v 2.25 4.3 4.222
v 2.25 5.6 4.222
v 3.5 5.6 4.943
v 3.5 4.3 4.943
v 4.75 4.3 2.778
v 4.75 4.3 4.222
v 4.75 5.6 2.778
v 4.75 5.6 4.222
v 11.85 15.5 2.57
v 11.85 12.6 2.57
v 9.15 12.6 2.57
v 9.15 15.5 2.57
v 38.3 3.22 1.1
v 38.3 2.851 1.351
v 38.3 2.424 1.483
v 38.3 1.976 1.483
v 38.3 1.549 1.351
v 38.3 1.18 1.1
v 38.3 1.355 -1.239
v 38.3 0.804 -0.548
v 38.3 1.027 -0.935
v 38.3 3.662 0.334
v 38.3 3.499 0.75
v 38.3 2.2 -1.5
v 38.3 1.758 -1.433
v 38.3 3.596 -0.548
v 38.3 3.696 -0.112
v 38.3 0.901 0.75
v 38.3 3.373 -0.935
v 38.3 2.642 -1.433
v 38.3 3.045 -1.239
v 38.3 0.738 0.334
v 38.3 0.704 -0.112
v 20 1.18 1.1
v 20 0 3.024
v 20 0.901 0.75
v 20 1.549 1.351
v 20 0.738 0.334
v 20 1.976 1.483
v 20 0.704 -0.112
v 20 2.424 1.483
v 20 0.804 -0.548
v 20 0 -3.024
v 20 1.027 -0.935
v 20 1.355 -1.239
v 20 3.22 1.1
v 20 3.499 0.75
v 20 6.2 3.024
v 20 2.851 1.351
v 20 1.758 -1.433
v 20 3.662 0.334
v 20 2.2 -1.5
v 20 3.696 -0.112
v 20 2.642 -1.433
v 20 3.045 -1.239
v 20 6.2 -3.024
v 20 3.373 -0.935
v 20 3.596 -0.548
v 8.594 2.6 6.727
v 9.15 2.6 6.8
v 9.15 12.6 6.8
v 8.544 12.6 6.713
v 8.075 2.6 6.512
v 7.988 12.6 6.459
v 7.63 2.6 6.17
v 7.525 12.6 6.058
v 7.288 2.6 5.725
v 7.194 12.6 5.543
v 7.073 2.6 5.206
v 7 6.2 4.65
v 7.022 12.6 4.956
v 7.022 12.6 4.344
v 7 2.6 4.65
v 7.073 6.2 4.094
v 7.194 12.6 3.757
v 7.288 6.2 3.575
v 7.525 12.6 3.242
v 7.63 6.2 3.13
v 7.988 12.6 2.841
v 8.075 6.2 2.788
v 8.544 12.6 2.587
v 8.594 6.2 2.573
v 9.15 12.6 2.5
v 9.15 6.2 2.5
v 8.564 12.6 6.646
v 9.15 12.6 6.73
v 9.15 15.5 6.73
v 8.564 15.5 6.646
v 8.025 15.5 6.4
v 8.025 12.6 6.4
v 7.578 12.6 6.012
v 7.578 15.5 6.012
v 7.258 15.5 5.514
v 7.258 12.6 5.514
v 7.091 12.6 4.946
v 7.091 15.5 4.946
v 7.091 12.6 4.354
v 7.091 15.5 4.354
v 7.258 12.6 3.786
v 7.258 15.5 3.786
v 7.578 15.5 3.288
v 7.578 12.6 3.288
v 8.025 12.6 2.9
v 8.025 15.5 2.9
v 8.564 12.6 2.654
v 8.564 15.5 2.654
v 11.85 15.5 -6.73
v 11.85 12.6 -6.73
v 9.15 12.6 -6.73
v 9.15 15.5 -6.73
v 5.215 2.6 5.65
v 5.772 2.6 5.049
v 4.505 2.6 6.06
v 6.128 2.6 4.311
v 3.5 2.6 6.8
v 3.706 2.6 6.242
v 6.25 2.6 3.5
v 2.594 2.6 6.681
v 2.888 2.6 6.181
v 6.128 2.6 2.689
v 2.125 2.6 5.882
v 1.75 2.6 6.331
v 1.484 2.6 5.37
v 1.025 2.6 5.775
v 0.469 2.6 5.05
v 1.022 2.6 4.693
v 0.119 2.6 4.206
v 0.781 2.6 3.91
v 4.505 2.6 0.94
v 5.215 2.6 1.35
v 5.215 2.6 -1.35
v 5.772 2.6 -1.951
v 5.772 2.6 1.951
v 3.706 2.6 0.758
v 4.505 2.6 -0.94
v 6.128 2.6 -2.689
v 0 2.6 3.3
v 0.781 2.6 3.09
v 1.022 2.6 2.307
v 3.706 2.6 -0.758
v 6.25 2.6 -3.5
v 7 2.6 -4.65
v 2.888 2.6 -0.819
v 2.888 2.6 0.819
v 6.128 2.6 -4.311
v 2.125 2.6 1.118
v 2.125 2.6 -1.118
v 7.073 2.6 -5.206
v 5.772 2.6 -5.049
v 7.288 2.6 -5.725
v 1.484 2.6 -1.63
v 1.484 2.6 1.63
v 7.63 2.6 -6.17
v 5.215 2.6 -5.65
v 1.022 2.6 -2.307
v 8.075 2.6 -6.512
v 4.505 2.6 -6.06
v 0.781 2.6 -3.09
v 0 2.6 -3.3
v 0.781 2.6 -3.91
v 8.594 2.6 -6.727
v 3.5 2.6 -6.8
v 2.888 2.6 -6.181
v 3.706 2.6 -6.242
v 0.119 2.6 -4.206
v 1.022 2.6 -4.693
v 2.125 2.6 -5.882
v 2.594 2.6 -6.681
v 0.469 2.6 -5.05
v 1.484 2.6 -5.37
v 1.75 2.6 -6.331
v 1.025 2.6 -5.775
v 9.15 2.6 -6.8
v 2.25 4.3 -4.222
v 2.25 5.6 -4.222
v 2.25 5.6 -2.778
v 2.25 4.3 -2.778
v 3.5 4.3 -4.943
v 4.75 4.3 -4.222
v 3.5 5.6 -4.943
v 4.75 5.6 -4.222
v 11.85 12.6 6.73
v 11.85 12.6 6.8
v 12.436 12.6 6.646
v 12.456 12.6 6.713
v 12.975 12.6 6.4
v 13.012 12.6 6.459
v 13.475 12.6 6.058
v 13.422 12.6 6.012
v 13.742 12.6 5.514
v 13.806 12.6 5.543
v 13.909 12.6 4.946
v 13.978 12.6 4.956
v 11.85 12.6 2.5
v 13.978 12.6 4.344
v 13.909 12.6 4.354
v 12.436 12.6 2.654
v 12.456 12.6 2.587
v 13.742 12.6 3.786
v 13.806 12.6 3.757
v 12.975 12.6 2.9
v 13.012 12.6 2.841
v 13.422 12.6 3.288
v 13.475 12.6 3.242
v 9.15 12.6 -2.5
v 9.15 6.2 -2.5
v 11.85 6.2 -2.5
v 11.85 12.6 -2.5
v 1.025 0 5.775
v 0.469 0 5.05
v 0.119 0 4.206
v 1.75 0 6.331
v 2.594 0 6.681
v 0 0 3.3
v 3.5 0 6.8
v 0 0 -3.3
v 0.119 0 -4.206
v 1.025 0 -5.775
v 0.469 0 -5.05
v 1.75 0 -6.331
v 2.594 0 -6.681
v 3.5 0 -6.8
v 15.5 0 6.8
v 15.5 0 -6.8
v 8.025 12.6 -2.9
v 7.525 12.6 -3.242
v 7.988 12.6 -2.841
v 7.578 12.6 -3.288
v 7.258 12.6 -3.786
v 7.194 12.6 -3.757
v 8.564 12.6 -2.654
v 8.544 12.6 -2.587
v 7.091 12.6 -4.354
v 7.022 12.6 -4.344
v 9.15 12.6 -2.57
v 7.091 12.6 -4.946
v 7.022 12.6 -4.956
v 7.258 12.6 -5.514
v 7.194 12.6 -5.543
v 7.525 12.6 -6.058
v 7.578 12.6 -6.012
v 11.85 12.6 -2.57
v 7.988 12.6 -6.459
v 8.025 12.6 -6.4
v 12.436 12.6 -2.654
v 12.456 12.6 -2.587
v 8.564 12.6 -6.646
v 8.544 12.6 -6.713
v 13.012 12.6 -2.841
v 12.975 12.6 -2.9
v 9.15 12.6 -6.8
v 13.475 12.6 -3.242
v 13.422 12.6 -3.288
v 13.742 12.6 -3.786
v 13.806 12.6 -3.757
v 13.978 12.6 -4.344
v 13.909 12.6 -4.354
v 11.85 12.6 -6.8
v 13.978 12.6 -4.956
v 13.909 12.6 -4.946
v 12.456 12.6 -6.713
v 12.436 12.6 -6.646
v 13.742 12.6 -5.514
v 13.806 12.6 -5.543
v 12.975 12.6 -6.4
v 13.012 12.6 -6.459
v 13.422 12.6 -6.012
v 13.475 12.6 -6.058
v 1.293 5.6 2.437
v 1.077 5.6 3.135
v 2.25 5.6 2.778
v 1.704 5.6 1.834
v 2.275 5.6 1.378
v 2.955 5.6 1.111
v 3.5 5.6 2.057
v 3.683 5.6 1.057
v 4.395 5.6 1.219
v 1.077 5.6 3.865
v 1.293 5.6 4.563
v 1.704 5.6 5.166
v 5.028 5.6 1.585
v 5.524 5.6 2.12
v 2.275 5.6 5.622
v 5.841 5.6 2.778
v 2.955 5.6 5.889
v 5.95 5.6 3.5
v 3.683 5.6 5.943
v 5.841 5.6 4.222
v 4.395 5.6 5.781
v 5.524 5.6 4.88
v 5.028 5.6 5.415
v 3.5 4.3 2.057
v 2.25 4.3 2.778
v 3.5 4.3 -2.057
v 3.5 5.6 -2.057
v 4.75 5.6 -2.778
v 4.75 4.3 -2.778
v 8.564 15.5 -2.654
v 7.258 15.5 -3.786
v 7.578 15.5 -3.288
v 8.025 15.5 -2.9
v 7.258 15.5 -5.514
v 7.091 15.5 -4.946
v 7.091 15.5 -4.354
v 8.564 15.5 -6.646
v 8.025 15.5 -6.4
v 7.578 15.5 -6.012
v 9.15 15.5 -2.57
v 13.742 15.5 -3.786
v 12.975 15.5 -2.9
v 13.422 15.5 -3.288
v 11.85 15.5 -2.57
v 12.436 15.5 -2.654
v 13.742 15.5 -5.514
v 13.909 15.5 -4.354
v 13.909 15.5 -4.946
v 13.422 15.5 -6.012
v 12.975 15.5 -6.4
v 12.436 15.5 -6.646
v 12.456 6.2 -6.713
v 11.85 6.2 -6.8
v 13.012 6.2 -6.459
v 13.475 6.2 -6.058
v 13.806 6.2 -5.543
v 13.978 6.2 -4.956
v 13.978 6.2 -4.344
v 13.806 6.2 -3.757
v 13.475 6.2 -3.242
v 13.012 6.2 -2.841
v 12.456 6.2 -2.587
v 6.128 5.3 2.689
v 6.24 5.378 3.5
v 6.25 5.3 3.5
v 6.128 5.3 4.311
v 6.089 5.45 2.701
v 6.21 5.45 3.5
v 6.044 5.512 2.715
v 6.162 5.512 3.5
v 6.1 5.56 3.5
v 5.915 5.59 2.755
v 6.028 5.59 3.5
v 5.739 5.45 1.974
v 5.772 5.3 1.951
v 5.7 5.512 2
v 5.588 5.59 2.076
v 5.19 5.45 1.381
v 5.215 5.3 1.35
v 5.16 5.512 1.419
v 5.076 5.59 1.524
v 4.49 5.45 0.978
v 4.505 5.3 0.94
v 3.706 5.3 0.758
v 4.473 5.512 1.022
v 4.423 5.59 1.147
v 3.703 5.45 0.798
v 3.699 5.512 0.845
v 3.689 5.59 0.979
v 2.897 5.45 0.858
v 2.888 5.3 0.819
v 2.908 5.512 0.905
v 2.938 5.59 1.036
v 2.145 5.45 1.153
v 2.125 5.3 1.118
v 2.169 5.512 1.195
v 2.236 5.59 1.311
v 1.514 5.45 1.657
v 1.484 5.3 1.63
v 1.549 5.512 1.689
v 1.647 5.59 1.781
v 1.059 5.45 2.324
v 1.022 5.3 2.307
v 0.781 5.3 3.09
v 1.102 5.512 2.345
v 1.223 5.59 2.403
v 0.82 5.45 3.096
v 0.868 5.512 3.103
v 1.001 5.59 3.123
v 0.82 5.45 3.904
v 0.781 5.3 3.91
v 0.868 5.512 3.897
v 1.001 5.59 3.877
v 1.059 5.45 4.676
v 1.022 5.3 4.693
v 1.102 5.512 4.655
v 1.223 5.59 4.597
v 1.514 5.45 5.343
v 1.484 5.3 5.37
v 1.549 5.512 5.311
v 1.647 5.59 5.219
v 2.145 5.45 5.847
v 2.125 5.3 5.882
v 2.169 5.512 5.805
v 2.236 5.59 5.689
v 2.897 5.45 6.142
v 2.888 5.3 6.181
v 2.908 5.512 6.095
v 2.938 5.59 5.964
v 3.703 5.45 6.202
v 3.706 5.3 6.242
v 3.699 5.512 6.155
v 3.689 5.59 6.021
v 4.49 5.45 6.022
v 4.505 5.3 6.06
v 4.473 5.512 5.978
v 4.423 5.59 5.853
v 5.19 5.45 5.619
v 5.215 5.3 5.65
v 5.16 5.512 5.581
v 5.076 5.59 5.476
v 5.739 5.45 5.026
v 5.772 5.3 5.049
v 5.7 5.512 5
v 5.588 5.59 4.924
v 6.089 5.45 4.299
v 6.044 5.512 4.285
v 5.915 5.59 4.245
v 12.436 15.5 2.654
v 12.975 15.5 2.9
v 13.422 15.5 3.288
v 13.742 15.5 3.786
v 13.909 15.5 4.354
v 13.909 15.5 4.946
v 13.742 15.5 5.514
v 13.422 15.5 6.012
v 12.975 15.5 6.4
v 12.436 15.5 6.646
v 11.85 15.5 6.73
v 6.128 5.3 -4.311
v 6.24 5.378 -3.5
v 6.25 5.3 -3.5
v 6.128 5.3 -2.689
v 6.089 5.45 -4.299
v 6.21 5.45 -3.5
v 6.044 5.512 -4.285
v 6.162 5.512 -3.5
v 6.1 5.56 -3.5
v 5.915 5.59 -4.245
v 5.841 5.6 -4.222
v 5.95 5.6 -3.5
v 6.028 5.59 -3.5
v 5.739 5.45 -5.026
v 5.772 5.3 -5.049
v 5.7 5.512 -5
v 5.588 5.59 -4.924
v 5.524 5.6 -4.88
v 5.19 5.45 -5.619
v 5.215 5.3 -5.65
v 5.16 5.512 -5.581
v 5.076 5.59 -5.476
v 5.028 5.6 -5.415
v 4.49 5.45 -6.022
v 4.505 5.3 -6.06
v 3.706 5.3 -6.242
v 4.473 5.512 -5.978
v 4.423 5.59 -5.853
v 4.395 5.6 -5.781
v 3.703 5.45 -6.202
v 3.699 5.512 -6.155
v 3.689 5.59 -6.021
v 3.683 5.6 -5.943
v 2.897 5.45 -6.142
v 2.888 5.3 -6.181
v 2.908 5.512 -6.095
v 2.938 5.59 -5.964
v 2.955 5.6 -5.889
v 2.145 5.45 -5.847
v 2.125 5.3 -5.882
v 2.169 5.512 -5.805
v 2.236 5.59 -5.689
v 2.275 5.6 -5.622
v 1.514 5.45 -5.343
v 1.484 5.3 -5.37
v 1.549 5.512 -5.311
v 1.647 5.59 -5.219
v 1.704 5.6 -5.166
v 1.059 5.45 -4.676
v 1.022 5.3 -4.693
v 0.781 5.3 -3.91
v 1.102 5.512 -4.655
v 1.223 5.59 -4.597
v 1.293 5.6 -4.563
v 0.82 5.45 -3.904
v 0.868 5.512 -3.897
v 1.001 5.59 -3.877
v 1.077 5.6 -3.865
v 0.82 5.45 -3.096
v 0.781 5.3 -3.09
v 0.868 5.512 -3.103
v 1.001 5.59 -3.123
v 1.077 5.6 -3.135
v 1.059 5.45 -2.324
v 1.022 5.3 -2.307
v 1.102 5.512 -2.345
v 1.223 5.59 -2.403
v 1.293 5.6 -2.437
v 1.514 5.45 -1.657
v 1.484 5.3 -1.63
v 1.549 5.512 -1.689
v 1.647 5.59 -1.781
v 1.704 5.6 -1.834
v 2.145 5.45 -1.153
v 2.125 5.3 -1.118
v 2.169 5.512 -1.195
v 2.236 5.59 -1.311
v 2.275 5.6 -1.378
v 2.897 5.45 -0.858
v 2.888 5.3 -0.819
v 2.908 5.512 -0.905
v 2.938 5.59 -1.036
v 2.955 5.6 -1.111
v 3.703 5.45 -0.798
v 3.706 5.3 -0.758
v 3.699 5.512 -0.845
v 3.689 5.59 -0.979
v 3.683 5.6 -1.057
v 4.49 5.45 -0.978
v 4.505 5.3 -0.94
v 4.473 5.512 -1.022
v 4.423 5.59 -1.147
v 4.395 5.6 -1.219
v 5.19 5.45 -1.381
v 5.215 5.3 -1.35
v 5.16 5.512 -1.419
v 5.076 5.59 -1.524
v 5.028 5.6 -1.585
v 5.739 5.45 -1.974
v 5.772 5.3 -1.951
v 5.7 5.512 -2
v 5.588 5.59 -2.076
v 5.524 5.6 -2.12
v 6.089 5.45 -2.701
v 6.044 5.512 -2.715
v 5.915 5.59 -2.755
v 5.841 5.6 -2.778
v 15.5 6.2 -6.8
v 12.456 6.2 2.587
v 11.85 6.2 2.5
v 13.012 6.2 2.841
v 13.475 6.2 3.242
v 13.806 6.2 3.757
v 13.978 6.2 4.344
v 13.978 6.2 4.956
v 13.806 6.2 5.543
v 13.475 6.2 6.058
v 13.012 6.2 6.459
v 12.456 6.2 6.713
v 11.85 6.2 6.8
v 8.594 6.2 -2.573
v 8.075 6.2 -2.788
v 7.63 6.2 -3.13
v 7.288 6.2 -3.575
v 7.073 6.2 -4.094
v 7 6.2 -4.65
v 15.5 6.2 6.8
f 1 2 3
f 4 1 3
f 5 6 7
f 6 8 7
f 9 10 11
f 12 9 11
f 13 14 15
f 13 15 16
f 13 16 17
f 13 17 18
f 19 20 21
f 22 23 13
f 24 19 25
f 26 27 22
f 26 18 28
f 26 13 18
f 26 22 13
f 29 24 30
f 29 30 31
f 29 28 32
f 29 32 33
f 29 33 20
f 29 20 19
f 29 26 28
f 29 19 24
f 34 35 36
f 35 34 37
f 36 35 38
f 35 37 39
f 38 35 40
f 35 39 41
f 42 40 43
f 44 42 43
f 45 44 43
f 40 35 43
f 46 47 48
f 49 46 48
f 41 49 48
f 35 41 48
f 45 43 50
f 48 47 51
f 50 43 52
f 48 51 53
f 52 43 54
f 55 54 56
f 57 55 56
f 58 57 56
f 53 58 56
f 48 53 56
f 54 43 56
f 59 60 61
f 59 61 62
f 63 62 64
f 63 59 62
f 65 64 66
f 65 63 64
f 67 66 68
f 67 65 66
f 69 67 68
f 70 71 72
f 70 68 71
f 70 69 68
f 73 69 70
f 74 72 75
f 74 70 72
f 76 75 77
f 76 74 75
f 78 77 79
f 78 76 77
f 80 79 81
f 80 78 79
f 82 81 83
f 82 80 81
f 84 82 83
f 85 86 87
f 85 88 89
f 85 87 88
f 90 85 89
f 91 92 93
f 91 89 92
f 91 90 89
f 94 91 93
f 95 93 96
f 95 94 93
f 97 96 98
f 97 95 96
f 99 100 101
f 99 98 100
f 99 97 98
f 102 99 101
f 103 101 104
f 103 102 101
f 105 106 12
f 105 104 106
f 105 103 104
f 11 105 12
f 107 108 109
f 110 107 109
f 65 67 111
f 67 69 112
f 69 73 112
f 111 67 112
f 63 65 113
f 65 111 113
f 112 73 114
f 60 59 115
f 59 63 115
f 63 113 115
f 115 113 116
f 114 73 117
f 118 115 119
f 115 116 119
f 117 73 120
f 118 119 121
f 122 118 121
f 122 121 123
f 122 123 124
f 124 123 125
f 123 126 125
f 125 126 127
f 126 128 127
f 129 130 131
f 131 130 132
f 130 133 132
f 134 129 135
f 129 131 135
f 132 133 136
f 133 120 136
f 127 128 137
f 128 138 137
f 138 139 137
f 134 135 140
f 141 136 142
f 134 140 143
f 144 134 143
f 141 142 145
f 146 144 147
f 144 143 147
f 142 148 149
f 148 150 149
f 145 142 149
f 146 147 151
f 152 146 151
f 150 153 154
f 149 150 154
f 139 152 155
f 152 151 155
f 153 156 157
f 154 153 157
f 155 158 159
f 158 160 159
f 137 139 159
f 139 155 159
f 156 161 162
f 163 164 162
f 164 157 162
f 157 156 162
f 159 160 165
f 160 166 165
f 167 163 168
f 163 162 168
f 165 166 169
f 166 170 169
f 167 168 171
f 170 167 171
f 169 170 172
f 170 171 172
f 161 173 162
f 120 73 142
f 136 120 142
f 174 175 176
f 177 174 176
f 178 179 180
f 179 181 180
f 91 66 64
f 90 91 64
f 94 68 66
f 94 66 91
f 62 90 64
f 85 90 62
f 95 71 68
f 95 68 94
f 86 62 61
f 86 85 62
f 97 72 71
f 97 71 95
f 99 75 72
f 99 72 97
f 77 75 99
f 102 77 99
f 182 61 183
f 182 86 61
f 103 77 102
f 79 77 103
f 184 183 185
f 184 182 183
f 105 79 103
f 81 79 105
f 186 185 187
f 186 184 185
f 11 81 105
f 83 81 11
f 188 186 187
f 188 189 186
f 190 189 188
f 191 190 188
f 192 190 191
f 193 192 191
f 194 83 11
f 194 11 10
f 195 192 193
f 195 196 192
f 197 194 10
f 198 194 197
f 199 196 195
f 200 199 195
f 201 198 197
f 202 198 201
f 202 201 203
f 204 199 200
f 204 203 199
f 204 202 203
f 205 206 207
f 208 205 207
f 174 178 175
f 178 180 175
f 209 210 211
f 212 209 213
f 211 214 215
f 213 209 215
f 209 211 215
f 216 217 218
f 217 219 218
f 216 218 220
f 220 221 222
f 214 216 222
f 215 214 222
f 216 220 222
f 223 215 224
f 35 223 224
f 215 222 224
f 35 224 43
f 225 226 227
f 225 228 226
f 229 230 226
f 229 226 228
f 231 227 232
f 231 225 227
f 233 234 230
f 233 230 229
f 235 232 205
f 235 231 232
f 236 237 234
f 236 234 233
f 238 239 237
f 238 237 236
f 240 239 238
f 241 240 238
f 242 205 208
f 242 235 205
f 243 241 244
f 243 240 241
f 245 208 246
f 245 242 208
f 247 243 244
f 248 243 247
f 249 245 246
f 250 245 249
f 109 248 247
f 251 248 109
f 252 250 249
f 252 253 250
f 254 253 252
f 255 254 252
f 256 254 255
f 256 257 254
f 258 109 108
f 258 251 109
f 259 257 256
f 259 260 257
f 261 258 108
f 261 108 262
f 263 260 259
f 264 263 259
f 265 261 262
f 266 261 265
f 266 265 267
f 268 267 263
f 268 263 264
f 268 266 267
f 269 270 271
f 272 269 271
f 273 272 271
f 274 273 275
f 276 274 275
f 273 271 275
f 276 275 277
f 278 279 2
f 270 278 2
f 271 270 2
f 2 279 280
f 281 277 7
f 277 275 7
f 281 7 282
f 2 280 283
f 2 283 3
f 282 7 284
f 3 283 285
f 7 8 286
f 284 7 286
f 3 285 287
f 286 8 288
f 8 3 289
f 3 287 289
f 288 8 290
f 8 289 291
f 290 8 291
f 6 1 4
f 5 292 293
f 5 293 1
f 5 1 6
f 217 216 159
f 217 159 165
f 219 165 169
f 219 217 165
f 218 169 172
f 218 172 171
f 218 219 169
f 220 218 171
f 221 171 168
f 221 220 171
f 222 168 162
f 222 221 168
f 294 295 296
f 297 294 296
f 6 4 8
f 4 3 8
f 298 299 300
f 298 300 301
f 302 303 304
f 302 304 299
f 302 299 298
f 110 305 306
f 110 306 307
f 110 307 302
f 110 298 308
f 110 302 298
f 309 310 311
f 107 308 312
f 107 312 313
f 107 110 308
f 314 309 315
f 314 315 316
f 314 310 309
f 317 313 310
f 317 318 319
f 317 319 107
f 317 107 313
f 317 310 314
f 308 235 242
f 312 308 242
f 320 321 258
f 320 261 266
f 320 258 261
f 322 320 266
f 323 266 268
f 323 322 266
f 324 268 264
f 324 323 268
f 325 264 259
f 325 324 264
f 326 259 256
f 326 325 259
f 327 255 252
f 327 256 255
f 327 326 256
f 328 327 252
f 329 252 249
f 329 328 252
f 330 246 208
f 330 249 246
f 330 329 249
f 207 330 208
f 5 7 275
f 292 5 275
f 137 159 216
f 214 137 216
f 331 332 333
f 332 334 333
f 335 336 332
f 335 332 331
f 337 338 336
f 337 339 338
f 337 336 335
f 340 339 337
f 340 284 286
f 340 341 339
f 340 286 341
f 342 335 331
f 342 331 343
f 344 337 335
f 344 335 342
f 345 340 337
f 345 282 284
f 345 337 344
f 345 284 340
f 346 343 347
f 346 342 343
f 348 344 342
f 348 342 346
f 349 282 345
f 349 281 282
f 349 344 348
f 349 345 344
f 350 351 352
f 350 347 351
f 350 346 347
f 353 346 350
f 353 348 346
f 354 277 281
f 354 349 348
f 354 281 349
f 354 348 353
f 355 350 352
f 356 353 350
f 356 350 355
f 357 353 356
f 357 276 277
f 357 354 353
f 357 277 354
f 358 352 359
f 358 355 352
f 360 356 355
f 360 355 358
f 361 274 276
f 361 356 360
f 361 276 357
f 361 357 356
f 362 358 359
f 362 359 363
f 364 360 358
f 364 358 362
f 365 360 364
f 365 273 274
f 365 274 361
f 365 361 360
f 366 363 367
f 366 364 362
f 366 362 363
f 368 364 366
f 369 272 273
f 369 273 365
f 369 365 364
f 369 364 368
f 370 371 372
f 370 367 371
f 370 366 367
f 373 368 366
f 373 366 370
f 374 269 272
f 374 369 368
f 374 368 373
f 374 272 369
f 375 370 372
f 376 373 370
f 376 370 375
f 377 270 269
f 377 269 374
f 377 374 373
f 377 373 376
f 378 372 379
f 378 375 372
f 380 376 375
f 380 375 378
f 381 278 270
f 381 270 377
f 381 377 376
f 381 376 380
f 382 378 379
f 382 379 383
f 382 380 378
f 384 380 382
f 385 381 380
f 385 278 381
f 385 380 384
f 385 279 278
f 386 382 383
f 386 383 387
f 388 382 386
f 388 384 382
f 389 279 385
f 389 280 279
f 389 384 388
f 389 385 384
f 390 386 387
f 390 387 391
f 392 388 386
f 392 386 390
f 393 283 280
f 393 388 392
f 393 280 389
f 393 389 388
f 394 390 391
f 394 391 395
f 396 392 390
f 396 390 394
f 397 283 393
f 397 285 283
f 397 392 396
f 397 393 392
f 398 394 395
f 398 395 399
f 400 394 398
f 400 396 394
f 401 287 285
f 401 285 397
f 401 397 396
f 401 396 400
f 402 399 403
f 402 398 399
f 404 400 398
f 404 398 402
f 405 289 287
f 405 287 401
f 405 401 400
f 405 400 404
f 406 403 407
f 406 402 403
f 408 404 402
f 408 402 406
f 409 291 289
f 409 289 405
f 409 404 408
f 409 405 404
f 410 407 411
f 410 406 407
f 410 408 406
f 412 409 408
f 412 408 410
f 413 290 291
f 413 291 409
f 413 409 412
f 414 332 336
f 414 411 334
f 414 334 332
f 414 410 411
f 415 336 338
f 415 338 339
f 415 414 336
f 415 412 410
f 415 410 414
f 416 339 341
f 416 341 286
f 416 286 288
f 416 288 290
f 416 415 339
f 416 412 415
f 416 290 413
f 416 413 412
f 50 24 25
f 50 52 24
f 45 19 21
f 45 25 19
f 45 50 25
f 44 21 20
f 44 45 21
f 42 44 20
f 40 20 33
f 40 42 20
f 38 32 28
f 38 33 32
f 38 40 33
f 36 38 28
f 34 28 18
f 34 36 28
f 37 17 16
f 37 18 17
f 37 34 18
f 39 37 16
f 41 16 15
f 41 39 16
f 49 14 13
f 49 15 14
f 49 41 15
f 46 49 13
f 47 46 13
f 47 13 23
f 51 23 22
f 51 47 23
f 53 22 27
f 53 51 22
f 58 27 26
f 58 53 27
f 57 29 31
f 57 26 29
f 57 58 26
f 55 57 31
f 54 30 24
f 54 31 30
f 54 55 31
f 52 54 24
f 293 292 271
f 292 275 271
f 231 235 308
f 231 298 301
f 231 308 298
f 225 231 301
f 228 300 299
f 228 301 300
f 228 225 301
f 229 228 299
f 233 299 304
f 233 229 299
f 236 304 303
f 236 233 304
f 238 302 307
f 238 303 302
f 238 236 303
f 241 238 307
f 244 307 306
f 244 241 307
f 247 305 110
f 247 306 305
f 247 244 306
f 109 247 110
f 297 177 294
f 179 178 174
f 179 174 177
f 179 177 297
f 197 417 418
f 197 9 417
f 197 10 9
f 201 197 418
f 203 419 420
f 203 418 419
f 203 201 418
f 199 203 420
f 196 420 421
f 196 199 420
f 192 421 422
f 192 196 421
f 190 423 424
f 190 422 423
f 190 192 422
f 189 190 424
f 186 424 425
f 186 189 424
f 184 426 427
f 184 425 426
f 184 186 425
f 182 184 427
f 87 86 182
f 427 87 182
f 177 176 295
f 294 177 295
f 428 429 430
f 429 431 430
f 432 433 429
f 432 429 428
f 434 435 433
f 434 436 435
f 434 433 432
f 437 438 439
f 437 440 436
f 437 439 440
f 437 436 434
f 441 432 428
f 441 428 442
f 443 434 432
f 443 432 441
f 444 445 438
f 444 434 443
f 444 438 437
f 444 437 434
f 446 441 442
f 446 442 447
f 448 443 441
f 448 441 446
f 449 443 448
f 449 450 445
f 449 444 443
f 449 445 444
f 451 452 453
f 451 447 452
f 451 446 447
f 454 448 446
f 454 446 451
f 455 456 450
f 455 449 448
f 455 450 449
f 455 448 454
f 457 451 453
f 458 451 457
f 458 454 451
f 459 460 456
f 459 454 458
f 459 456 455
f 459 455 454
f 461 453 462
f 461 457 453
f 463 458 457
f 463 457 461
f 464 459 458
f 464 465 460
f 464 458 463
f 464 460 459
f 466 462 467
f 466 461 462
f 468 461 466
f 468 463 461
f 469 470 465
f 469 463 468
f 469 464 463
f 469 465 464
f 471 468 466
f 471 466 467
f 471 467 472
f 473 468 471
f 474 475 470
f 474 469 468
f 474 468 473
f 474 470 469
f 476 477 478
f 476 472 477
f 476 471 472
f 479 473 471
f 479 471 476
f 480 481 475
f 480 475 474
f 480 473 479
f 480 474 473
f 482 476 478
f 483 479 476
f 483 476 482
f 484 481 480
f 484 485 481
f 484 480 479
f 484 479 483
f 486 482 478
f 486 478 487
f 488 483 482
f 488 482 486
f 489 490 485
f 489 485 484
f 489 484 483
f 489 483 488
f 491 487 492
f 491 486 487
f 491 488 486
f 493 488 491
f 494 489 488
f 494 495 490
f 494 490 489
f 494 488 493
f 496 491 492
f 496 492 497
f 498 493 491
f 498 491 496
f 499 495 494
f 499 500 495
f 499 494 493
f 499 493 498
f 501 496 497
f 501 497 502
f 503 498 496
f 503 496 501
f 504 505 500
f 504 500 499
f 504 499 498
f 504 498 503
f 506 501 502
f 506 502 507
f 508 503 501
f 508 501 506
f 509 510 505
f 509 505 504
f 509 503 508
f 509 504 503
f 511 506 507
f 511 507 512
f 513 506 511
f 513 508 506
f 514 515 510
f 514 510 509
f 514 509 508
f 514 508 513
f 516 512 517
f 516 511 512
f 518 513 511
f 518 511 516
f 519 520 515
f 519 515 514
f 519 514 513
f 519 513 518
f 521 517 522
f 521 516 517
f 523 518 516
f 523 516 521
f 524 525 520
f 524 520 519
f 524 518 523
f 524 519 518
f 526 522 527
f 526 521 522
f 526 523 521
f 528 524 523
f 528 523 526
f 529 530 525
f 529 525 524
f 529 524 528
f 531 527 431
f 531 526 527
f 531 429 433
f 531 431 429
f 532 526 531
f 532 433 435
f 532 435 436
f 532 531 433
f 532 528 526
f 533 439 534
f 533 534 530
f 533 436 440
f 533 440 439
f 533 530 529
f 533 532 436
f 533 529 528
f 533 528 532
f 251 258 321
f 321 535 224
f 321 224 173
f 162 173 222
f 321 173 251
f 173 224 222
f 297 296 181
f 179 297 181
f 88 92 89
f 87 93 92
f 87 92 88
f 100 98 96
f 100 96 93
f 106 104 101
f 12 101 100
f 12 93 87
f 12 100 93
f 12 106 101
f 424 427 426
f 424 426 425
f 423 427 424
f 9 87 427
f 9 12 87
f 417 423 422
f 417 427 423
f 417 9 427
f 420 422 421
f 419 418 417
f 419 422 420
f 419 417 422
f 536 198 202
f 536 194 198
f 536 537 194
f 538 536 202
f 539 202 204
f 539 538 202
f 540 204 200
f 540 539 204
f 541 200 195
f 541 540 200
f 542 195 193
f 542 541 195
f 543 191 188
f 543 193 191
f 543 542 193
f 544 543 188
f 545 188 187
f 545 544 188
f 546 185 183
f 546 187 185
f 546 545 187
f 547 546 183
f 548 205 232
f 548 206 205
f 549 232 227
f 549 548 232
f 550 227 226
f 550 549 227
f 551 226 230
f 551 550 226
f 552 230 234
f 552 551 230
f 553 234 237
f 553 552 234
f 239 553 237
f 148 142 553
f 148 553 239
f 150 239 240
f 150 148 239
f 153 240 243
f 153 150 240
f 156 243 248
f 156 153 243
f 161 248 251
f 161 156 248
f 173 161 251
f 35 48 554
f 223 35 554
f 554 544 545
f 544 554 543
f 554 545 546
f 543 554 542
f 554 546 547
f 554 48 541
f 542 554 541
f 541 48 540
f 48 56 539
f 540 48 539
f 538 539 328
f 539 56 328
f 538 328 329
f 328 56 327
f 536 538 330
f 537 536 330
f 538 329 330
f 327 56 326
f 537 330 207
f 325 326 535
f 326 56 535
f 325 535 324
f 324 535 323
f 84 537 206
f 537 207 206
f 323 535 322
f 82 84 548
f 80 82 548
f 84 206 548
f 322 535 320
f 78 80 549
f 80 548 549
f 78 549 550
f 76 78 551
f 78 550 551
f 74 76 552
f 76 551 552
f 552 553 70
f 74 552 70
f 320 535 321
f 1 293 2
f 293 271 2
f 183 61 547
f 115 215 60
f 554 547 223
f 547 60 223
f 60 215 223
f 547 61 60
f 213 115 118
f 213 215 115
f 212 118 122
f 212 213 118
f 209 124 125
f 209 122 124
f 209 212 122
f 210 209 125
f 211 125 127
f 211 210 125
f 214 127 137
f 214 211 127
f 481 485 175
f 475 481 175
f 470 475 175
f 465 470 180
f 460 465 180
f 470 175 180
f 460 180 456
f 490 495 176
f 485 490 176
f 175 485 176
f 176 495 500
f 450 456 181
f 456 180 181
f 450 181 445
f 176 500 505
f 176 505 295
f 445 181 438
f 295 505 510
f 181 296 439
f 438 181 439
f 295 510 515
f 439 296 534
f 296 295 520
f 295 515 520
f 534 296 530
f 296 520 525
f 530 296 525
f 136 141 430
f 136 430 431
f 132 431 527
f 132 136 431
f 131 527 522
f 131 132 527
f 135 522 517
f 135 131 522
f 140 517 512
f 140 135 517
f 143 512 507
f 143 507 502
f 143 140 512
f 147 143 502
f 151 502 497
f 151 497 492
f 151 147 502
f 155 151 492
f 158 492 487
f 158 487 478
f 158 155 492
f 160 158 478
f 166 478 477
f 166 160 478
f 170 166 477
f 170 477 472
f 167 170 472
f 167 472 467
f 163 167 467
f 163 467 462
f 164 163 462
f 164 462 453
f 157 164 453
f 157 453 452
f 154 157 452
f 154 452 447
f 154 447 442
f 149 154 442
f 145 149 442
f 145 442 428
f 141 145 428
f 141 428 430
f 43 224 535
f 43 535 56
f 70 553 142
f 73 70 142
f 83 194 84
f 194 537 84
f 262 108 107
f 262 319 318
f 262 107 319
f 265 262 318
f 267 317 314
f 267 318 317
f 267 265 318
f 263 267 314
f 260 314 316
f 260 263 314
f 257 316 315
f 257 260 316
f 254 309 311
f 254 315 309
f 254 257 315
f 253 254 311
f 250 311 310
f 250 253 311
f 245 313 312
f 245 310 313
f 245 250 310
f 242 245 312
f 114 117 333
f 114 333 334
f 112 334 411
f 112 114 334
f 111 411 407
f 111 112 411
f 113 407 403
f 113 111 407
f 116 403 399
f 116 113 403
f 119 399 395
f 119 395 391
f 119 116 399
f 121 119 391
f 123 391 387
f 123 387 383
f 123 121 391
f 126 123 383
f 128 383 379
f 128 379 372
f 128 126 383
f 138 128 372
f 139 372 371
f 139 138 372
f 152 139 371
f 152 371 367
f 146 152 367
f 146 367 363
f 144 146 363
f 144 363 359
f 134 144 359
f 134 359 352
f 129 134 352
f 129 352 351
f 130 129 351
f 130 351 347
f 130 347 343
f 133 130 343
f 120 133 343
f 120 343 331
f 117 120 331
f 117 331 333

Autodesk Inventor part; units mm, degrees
sketch "Sketch_1" plane through (0, 0, 0) normal (0, 0, 1) x (1, 0, 0)
  line L0 (0, 2.6) -> (0, 0)
  line L1 (0, 0) -> (20, 0)
  line L2 (20, 0) -> (20, 6.2)
  line L3 (20, 6.2) -> (7, 6.2)
  line L4 (7, 6.2) -> (7, 2.6)
  line L5 (7, 2.6) -> (0, 2.6)
extrude "Extrusion1" add sketch "Sketch_1" along normal mid plane 13.6
fillet "Fillet1" radius 3.5 2 edges at (0, 1.3, 6.8) (0, 1.3, -6.8)
fillet "Fillet2" radius 2.15 2 edges at (7, 4.4, 6.8) (7, 4.4, -6.8)
sketch "Sketch_4" plane through (20, 0, 0) normal (1, 0, 0) x (0, 0, -1)
  circle A0 centre (0, 2.2) radius 1.5
extrude "Extrusion2" add sketch "Sketch_4" along normal blind 18.3
sketch "Sketch_7" plane through (0, 0, 3.5) normal (0, 0, 1) x (1, 0, 0)
  line L0 (3.5, 2.6) -> (3.5, 5.6)
  line L1 (3.5, 5.6) -> (5.95, 5.6)
  arc A0 (6.25, 5.3) -> (5.95, 5.6) centre (5.95, 5.3) ccw
  line L2 (6.25, 5.3) -> (6.25, 2.6)
  line L3 (6.25, 2.6) -> (3.5, 2.6)
  line L4 (3.5, 2.6) -> (3.5, 5.6)
revolve "Revolution1" add sketch "Sketch_7" angle 360 about axis through (3.5, 2.6, 3.5) along (0, -1, 0)
pattern_linear "Rectangular Pattern1" count 2 spacing 7 along (0, 0, -1) of "Revolution1"
sketch "Sketch_9" plane through (0, 5.6, 0) normal (0, 1, 0) x (1, 0, 0)
  line L0 (2.25, -4.2217) -> (3.5, -4.9434)
  line L1 (3.5, -4.9434) -> (4.75, -4.2217)
  line L2 (4.75, -4.2217) -> (4.75, -2.7783)
  line L3 (4.75, -2.7783) -> (3.5, -2.0566)
  line L4 (3.5, -2.0566) -> (2.25, -2.7783)
  line L5 (2.25, -2.7783) -> (2.25, -4.2217)
extrude "Extrusion3" cut sketch "Sketch_9" against normal blind 1.3
pattern_linear "Rectangular Pattern2" count 2 spacing 7 along (0, 0, -1) of "Extrusion3"
sketch "__1" plane through (0, 6.2, 0) normal (0, 1, 0) x (1, 0, 0)
  arc A0 (9.15, -2.5) -> (9.15, -6.8) centre (9.15, -4.65) ccw
  line L0 (9.15, -6.8) -> (11.85, -6.8)
  arc A1 (11.85, -6.8) -> (11.85, -2.5) centre (11.85, -4.65) ccw
  line L1 (11.85, -2.5) -> (9.15, -2.5)
extrude "Extrusion4" add sketch "__1" along normal blind 6.4
sketch "__2" plane through (0, 6.2, 0) normal (0, 1, 0) x (1, 0, 0)
  arc A0 (9.15, 6.8) -> (9.15, 2.5) centre (9.15, 4.65) ccw
  line L0 (9.15, 2.5) -> (11.85, 2.5)
  arc A1 (11.85, 2.5) -> (11.85, 6.8) centre (11.85, 4.65) ccw
  line L1 (11.85, 6.8) -> (9.15, 6.8)
extrude "Extrusion5" add sketch "__2" along normal blind 6.4
sketch "__3" plane through (0, 12.6, 0) normal (0, 1, 0) x (1, 0, 0)
  arc A0 (9.15, -2.57) -> (9.15, -6.73) centre (9.15, -4.65) ccw
  line L0 (9.15, -6.73) -> (11.85, -6.73)
  arc A1 (11.85, -6.73) -> (11.85, -2.57) centre (11.85, -4.65) ccw
  line L1 (11.85, -2.57) -> (9.15, -2.57)
extrude "Extrusion6" add sketch "__3" along normal blind 2.9
sketch "__4" plane through (0, 12.6, 0) normal (0, 1, 0) x (1, 0, 0)
  arc A0 (9.15, 6.73) -> (9.15, 2.57) centre (9.15, 4.65) ccw
  line L0 (9.15, 2.57) -> (11.85, 2.57)
  arc A1 (11.85, 2.57) -> (11.85, 6.73) centre (11.85, 4.65) ccw
  line L1 (11.85, 6.73) -> (9.15, 6.73)
extrude "Extrusion7" add sketch "__4" along normal blind 2.9
sketch "__5" plane through (0, 0, 0) normal (0, 1, 0) x (-1, 0, 0)
  line L0 (-15.5, 6.8) -> (-20, 6.8)
  line L1 (-20, 6.8) -> (-20, 3.0241)
  line L2 (-20, 3.0241) -> (-15.5, 6.8)
extrude "Extrusion8" cut sketch "__5" along normal blind 10
sketch "__6" plane through (0, 0, 0) normal (0, 1, 0) x (-1, 0, 0)
  line L0 (-15.5, -6.8) -> (-20, -3.0241)
  line L1 (-20, -3.0241) -> (-20, -6.8)
  line L2 (-20, -6.8) -> (-15.5, -6.8)
extrude "Extrusion9" cut sketch "__6" along normal blind 10
ref_plane "gth4_sensor_XY" through (0, 0, 0) normal (1, 0, 0) x (0, 0, -1)
ref_plane "gth4_sensor_YZ" through (0, 0, 0) normal (0, 0, -1) x (0, 1, 0)
ref_plane "gth4_sensor_ZX" through (0, 0, 0) normal (0, 1, 0) x (1, 0, 0)
properties part number "ETH2-14-sensor"
